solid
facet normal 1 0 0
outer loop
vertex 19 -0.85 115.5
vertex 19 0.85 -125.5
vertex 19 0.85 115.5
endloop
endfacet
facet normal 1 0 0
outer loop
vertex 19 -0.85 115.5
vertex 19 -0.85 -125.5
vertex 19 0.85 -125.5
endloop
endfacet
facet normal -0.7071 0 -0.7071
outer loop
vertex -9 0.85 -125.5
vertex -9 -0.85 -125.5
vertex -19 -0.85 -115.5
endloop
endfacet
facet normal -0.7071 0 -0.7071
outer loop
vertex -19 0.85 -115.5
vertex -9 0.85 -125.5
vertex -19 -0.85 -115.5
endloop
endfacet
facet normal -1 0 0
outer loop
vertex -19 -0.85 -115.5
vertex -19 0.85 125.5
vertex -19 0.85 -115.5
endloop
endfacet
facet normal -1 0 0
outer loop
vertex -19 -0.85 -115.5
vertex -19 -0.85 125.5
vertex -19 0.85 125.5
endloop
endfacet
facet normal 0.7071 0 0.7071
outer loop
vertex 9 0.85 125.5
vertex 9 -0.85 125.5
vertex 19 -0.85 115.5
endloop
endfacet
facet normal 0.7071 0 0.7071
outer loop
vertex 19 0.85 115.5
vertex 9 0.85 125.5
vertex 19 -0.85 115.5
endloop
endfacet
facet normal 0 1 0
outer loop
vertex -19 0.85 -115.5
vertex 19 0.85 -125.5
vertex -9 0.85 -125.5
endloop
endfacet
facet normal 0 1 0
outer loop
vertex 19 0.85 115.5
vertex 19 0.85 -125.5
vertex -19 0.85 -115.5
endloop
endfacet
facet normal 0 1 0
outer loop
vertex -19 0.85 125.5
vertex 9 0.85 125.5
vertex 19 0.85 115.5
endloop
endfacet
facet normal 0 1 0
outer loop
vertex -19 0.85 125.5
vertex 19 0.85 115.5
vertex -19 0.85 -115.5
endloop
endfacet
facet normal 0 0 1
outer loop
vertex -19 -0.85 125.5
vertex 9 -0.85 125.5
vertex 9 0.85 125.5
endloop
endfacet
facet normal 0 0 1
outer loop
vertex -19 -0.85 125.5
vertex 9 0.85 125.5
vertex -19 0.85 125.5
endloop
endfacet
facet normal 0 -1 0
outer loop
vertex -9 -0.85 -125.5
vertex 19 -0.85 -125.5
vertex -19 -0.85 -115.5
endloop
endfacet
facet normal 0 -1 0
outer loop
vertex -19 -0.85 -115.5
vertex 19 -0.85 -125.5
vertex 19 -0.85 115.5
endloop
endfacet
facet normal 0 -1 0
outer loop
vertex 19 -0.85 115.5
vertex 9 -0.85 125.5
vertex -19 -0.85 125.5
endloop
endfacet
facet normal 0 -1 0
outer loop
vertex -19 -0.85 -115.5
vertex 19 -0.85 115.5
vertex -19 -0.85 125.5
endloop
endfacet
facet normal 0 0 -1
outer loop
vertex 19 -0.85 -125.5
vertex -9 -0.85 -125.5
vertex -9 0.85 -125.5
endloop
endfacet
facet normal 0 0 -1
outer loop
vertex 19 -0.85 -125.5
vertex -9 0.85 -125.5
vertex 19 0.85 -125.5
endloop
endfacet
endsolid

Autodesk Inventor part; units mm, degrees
ref_plane "YZ Plane" through (0, 0, 0) normal (1, 0, 0) x (0, 1, 0)
ref_plane "XZ Plane" through (0, 0, 0) normal (0, 1, 0) x (-1, 0, 0)
ref_plane "XY Plane" through (0, 0, 0) normal (0, 0, 1) x (1, 0, 0)
sketch "Sketch1" plane through (0, 0, 0) normal (0, 1, 0) x (-1, 0, 0)
  line L0 (-19, 125.5) -> (19, 125.5)
  line L1 (19, 125.5) -> (19, -125.5)
  line L2 (19, -125.5) -> (-19, -125.5)
  line L3 (-19, -125.5) -> (-19, 125.5)
  line L4 (-19, 125.5) -> (19, -125.5) construction
  line L5 (19, 125.5) -> (-19, -125.5) construction
  line L6 (-9, 125.5) -> (-19, 115.5)
  line L7 (9, -125.5) -> (19, -115.5)
  point P0 (0, 0)
  dimension "d0" = 38
  dimension "d1" = 251
  dimension "d2" = 10
  dimension "d3" = 10
extrude "Extrusion1" add sketch "Sketch1" along normal mid plane 1.7 contours L0 L1 L7 L2 L3 L6
equation "\"d3\" = d2"
properties part number "VPTrack" material "Paper"
